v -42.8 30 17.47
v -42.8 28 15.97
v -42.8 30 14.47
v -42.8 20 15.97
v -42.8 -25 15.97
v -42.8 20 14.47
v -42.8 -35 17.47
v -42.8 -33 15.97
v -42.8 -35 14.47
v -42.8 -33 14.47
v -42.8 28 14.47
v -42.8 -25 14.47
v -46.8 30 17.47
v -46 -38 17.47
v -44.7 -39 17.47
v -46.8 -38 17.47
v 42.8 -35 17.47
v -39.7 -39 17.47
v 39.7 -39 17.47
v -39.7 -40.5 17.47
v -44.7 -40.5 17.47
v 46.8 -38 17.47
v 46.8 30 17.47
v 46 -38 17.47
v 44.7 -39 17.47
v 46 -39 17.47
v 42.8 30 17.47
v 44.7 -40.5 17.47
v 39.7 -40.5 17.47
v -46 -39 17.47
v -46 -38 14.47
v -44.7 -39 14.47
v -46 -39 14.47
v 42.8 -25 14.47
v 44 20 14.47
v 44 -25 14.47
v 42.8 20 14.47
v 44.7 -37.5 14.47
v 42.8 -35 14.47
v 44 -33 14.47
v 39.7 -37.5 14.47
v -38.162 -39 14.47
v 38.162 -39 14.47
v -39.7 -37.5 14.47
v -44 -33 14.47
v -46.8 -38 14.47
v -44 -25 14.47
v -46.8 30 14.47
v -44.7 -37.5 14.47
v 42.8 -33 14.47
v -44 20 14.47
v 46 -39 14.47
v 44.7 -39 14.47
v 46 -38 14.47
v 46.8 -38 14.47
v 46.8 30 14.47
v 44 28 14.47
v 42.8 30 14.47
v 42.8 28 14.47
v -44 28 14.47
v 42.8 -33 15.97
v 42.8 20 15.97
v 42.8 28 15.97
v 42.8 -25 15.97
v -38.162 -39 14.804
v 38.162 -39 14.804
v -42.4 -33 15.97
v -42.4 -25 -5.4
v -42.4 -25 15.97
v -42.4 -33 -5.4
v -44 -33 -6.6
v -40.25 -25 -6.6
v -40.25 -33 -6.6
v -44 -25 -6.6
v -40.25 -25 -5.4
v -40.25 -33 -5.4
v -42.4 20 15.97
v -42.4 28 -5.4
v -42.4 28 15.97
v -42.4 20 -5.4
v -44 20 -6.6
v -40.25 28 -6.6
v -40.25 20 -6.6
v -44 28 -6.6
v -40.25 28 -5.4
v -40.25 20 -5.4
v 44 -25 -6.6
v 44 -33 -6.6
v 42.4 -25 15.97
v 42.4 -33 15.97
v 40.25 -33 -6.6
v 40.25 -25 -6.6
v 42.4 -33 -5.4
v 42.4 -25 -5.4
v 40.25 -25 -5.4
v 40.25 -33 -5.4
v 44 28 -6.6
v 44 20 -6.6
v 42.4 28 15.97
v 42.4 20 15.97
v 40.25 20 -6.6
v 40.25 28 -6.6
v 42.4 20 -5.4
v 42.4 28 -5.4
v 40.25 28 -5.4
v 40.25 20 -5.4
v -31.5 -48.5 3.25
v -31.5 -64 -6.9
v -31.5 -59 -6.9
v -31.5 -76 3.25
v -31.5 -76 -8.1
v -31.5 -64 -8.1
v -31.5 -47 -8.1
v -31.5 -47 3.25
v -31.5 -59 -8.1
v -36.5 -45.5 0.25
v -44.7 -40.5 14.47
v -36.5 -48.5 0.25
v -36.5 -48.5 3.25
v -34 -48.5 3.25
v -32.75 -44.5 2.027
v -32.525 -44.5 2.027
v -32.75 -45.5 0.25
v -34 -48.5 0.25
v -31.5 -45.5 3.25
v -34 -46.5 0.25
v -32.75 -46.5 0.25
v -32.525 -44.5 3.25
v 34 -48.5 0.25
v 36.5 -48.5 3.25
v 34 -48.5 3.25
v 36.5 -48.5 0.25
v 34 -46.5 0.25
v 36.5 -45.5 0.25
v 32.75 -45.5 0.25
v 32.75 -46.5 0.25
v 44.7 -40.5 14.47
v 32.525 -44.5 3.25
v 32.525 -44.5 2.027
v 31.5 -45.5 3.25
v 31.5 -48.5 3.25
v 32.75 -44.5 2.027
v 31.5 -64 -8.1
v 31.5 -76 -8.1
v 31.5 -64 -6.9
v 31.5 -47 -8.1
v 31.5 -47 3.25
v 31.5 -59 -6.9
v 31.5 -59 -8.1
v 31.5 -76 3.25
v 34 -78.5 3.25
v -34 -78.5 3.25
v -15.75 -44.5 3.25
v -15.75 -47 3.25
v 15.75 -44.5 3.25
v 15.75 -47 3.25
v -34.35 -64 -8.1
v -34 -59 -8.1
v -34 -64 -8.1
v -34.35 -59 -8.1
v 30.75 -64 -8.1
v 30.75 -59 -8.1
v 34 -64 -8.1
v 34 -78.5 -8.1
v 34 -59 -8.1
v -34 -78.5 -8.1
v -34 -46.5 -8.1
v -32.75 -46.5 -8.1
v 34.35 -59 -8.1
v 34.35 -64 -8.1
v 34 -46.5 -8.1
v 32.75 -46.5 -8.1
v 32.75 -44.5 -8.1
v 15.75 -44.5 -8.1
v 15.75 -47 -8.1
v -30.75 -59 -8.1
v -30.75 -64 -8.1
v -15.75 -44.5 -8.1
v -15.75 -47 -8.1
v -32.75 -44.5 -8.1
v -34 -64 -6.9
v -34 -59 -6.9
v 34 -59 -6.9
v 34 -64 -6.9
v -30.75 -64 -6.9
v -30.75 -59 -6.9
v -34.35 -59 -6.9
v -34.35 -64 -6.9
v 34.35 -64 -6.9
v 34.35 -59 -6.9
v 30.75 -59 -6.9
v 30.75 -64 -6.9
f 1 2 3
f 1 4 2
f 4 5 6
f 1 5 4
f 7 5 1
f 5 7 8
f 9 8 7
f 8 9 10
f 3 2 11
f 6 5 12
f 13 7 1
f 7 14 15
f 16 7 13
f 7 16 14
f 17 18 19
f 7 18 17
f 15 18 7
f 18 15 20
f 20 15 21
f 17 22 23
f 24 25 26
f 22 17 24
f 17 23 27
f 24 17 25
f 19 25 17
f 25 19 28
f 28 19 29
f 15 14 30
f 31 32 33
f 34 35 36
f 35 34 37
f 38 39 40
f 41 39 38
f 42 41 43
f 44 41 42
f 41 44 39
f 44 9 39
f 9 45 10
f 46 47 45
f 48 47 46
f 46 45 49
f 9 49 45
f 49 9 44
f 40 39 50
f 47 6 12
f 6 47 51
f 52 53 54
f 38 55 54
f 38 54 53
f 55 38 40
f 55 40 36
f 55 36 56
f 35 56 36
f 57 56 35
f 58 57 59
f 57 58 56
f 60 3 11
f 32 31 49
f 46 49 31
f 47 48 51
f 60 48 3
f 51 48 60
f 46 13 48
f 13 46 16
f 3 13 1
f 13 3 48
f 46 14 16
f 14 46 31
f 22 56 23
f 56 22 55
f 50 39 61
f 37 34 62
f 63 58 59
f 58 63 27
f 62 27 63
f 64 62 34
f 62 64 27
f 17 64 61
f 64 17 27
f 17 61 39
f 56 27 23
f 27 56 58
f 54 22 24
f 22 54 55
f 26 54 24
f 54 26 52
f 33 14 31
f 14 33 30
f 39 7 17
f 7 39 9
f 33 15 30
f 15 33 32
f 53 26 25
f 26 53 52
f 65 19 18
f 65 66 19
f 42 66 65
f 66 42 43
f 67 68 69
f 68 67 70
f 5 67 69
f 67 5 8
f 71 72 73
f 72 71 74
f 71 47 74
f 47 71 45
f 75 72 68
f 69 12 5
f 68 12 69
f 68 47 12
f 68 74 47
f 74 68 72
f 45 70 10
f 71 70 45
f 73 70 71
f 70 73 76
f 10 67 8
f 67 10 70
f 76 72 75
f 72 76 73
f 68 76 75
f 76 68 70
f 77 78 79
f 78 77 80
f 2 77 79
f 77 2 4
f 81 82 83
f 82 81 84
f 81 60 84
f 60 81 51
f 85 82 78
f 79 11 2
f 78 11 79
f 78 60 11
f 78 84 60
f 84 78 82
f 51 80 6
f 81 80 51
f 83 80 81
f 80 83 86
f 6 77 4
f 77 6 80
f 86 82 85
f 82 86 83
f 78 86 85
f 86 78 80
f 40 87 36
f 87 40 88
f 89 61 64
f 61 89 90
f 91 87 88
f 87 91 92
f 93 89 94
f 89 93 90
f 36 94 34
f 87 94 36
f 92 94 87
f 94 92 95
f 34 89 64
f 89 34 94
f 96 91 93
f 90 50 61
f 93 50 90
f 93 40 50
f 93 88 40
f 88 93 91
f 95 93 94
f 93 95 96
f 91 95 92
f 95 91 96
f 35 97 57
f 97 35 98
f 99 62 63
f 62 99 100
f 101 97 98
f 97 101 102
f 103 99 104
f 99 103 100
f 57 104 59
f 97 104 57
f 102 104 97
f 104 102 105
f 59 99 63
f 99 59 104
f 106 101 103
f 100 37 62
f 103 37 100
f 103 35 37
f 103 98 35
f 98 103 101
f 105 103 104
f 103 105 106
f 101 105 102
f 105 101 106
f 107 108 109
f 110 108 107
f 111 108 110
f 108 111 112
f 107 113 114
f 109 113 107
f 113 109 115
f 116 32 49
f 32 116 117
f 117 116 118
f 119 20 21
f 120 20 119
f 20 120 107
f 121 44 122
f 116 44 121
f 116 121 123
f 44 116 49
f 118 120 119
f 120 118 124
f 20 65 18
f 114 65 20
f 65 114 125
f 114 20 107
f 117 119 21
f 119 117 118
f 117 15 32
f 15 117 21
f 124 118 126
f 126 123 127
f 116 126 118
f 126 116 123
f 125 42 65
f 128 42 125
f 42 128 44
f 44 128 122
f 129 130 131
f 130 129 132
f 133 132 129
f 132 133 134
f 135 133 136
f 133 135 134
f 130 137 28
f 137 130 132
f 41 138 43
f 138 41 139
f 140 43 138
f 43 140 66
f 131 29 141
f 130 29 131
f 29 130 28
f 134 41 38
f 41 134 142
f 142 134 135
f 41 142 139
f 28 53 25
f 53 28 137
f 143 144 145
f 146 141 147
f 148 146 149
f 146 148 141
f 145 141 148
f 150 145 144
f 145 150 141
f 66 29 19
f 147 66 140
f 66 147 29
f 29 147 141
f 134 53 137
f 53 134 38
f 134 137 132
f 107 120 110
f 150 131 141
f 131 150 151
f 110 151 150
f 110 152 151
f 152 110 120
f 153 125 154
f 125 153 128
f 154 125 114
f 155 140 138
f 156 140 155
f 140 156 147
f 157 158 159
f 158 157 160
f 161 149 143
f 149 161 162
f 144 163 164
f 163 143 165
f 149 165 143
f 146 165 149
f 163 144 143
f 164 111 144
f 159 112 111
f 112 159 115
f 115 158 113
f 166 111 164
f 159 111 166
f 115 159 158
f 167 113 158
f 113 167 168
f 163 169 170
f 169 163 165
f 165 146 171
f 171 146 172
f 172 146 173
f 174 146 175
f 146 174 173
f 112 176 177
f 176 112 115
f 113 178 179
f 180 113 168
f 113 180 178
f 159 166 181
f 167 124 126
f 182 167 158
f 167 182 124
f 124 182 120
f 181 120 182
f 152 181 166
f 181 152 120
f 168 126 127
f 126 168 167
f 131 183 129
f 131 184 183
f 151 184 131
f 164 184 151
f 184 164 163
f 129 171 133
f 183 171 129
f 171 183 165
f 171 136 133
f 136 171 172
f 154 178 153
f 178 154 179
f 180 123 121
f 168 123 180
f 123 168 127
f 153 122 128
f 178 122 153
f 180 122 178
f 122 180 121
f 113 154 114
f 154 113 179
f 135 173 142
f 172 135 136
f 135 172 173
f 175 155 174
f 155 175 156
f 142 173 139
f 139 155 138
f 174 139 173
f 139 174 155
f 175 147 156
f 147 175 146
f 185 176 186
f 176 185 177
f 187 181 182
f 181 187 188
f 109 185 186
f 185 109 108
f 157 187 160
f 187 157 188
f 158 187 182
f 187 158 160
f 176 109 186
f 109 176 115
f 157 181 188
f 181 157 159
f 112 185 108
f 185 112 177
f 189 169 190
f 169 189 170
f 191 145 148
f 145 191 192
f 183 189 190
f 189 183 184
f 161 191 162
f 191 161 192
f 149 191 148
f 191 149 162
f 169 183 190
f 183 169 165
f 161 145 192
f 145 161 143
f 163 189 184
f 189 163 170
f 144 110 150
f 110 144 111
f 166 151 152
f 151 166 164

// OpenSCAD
// First-fit shared carrier for the Tufty 2350, Qw/ST Pad, and sensor stick.
// Dimensions are millimetres. This is a fit-test design, not a production-ready case.

$fn = 32;

// Badgeware blank bounds measured from Pimoroni's supplied STL:
// X = 84 mm, Z = 76 mm, original Y (depth) = 21.37 mm.
badge_width = 84;
badge_height = 76;

// Pimoroni Qw/ST Pad case mesh bounds: 62 x 29 x 8.35 mm.
pad_case_width = 62;
pad_case_height = 29;
pad_case_depth = 8.35;
pad_clearance = 0.5;

// Set to 1 to show the official Badgeware case and Qw/ST Pad case meshes.
show_reference_models = 0;

// World axes: X = badge width, Y = vertical, Z = front/back.
badge_front_z = -6.6;
badge_back_z = 14.77;
frame_back_z = badge_back_z + 1.2;
frame_thickness = 3;
frame_rail_width = 4;
badge_clip_y = [-29, 24];
badge_clip_height = 8;
badge_clip_wall = 1.6;
badge_clip_lip = 1.7;

pad_center_y = -61.5;
pad_back_z = 1.75;
pad_rail_width = 2.5;
pad_lip = 1.5;
pad_clip_height = 5;

module badge_reference() {
    // Source STL axes are X=width, Y=depth, Z=height.
    // Rotate so the badge's height is world Y and its front points toward -Z.
    rotate([-90, 0, 0])
        translate([0, 0, 5])
            import("../pimoroni-badgeware-blank/Badge_Case_Solid_w_Holes.stl");
}

module pad_reference() {
    // Reflect the official case so the button face points toward the badge front.
    translate([-29, pad_center_y - 12.5, pad_back_z - 2.6])
        mirror([0, 0, 1])
            import("../qwst-pad-game-controller-case/QwST Pad Casing Front.stl");
    translate([-29, pad_center_y - 12.5, pad_back_z - 2.6])
        mirror([0, 0, 1])
            import("../qwst-pad-game-controller-case/QwST Pad Casing Back.stl");
}

module rear_frame() {
    // Open back frame keeps the Tufty's rear controls and connectors accessible.
    for (side = [-1, 1]) {
        translate([side * (badge_width / 2 + 2.8), -4, frame_back_z])
            cube([frame_rail_width, badge_height - 8, frame_thickness], center=true);
    }
    translate([0, -badge_height / 2 + 1, frame_back_z])
        cube([badge_width + 2 * frame_rail_width, frame_rail_width, frame_thickness], center=true);
}

module badge_edge_clips() {
    for (side = [-1, 1], clip_y = badge_clip_y) {
        // Flexible side spring and a short front-facing retaining toe.
        translate([side * (badge_width / 2 + 1.2), clip_y, (badge_front_z + frame_back_z) / 2])
            cube([badge_clip_wall, badge_clip_height, frame_back_z - badge_front_z], center=true);
        translate([side * (badge_width / 2 - badge_clip_lip / 2 + 0.2),
                   clip_y,
                   badge_front_z + 0.6])
            cube([badge_clip_lip + 0.5, badge_clip_height, 1.2], center=true);
    }
}

module pad_supports() {
    // Two struts bridge the depth offset between the badge rails and the pad cradle.
    for (side = [-1, 1]) {
        hull() {
            translate([side * 42.2, -badge_height / 2 - 1, frame_back_z])
                cube([5, 3, frame_thickness], center=true);
            translate([side * 34, pad_center_y + pad_case_height / 2, pad_back_z])
                cube([5, 3, frame_thickness], center=true);
        }
    }
}

module pad_holder() {
    holder_width = pad_case_width + 2 * pad_clearance;
    holder_height = pad_case_height + 2 * pad_clearance;
    z_rear = pad_back_z + frame_thickness / 2;
    z_front = pad_back_z - pad_case_depth - pad_lip;
    stop_width = 17;
    stop_x = holder_width / 2 + pad_rail_width / 2 - stop_width / 2;

    // Side rails and lower seat retain the official case while leaving its face open.
    for (side = [-1, 1]) {
        translate([side * (holder_width / 2 + pad_rail_width / 2),
                   pad_center_y,
                   (z_rear + z_front) / 2])
            cube([pad_rail_width, holder_height, z_rear - z_front], center=true);
    }
    translate([0, pad_center_y - holder_height / 2 - pad_rail_width / 2 + 0.5,
               (z_rear + z_front) / 2])
        cube([holder_width + 2 * pad_rail_width, pad_rail_width, z_rear - z_front], center=true);

    // Two end stops retain the case while leaving the central Qw/ST sockets open.
    for (side = [-1, 1]) {
        translate([side * stop_x,
                   pad_center_y + holder_height / 2 + pad_rail_width / 2 - 0.5,
                   (z_rear + z_front) / 2])
            cube([stop_width, pad_rail_width, z_rear - z_front], center=true);
    }

    // Small retaining toes overlap only the outside edge of the pad case.
    for (side = [-1, 1]) {
        translate([side * (holder_width / 2 + pad_rail_width / 2 - 0.2),
                   pad_center_y,
                   z_front + 0.6])
            cube([pad_lip + pad_rail_width - 0.4, pad_clip_height, 1.2], center=true);
    }
}

module cradle() {
    union() {
        rear_frame();
        badge_edge_clips();
        pad_supports();
        pad_holder();
    }
}

if (show_reference_models) {
    %color([0.95, 0.45, 0.05, 0.35]) badge_reference();
    %color([0.1, 0.3, 0.8, 0.55]) pad_reference();
}

color([0.2, 0.65, 0.75]) cradle();
